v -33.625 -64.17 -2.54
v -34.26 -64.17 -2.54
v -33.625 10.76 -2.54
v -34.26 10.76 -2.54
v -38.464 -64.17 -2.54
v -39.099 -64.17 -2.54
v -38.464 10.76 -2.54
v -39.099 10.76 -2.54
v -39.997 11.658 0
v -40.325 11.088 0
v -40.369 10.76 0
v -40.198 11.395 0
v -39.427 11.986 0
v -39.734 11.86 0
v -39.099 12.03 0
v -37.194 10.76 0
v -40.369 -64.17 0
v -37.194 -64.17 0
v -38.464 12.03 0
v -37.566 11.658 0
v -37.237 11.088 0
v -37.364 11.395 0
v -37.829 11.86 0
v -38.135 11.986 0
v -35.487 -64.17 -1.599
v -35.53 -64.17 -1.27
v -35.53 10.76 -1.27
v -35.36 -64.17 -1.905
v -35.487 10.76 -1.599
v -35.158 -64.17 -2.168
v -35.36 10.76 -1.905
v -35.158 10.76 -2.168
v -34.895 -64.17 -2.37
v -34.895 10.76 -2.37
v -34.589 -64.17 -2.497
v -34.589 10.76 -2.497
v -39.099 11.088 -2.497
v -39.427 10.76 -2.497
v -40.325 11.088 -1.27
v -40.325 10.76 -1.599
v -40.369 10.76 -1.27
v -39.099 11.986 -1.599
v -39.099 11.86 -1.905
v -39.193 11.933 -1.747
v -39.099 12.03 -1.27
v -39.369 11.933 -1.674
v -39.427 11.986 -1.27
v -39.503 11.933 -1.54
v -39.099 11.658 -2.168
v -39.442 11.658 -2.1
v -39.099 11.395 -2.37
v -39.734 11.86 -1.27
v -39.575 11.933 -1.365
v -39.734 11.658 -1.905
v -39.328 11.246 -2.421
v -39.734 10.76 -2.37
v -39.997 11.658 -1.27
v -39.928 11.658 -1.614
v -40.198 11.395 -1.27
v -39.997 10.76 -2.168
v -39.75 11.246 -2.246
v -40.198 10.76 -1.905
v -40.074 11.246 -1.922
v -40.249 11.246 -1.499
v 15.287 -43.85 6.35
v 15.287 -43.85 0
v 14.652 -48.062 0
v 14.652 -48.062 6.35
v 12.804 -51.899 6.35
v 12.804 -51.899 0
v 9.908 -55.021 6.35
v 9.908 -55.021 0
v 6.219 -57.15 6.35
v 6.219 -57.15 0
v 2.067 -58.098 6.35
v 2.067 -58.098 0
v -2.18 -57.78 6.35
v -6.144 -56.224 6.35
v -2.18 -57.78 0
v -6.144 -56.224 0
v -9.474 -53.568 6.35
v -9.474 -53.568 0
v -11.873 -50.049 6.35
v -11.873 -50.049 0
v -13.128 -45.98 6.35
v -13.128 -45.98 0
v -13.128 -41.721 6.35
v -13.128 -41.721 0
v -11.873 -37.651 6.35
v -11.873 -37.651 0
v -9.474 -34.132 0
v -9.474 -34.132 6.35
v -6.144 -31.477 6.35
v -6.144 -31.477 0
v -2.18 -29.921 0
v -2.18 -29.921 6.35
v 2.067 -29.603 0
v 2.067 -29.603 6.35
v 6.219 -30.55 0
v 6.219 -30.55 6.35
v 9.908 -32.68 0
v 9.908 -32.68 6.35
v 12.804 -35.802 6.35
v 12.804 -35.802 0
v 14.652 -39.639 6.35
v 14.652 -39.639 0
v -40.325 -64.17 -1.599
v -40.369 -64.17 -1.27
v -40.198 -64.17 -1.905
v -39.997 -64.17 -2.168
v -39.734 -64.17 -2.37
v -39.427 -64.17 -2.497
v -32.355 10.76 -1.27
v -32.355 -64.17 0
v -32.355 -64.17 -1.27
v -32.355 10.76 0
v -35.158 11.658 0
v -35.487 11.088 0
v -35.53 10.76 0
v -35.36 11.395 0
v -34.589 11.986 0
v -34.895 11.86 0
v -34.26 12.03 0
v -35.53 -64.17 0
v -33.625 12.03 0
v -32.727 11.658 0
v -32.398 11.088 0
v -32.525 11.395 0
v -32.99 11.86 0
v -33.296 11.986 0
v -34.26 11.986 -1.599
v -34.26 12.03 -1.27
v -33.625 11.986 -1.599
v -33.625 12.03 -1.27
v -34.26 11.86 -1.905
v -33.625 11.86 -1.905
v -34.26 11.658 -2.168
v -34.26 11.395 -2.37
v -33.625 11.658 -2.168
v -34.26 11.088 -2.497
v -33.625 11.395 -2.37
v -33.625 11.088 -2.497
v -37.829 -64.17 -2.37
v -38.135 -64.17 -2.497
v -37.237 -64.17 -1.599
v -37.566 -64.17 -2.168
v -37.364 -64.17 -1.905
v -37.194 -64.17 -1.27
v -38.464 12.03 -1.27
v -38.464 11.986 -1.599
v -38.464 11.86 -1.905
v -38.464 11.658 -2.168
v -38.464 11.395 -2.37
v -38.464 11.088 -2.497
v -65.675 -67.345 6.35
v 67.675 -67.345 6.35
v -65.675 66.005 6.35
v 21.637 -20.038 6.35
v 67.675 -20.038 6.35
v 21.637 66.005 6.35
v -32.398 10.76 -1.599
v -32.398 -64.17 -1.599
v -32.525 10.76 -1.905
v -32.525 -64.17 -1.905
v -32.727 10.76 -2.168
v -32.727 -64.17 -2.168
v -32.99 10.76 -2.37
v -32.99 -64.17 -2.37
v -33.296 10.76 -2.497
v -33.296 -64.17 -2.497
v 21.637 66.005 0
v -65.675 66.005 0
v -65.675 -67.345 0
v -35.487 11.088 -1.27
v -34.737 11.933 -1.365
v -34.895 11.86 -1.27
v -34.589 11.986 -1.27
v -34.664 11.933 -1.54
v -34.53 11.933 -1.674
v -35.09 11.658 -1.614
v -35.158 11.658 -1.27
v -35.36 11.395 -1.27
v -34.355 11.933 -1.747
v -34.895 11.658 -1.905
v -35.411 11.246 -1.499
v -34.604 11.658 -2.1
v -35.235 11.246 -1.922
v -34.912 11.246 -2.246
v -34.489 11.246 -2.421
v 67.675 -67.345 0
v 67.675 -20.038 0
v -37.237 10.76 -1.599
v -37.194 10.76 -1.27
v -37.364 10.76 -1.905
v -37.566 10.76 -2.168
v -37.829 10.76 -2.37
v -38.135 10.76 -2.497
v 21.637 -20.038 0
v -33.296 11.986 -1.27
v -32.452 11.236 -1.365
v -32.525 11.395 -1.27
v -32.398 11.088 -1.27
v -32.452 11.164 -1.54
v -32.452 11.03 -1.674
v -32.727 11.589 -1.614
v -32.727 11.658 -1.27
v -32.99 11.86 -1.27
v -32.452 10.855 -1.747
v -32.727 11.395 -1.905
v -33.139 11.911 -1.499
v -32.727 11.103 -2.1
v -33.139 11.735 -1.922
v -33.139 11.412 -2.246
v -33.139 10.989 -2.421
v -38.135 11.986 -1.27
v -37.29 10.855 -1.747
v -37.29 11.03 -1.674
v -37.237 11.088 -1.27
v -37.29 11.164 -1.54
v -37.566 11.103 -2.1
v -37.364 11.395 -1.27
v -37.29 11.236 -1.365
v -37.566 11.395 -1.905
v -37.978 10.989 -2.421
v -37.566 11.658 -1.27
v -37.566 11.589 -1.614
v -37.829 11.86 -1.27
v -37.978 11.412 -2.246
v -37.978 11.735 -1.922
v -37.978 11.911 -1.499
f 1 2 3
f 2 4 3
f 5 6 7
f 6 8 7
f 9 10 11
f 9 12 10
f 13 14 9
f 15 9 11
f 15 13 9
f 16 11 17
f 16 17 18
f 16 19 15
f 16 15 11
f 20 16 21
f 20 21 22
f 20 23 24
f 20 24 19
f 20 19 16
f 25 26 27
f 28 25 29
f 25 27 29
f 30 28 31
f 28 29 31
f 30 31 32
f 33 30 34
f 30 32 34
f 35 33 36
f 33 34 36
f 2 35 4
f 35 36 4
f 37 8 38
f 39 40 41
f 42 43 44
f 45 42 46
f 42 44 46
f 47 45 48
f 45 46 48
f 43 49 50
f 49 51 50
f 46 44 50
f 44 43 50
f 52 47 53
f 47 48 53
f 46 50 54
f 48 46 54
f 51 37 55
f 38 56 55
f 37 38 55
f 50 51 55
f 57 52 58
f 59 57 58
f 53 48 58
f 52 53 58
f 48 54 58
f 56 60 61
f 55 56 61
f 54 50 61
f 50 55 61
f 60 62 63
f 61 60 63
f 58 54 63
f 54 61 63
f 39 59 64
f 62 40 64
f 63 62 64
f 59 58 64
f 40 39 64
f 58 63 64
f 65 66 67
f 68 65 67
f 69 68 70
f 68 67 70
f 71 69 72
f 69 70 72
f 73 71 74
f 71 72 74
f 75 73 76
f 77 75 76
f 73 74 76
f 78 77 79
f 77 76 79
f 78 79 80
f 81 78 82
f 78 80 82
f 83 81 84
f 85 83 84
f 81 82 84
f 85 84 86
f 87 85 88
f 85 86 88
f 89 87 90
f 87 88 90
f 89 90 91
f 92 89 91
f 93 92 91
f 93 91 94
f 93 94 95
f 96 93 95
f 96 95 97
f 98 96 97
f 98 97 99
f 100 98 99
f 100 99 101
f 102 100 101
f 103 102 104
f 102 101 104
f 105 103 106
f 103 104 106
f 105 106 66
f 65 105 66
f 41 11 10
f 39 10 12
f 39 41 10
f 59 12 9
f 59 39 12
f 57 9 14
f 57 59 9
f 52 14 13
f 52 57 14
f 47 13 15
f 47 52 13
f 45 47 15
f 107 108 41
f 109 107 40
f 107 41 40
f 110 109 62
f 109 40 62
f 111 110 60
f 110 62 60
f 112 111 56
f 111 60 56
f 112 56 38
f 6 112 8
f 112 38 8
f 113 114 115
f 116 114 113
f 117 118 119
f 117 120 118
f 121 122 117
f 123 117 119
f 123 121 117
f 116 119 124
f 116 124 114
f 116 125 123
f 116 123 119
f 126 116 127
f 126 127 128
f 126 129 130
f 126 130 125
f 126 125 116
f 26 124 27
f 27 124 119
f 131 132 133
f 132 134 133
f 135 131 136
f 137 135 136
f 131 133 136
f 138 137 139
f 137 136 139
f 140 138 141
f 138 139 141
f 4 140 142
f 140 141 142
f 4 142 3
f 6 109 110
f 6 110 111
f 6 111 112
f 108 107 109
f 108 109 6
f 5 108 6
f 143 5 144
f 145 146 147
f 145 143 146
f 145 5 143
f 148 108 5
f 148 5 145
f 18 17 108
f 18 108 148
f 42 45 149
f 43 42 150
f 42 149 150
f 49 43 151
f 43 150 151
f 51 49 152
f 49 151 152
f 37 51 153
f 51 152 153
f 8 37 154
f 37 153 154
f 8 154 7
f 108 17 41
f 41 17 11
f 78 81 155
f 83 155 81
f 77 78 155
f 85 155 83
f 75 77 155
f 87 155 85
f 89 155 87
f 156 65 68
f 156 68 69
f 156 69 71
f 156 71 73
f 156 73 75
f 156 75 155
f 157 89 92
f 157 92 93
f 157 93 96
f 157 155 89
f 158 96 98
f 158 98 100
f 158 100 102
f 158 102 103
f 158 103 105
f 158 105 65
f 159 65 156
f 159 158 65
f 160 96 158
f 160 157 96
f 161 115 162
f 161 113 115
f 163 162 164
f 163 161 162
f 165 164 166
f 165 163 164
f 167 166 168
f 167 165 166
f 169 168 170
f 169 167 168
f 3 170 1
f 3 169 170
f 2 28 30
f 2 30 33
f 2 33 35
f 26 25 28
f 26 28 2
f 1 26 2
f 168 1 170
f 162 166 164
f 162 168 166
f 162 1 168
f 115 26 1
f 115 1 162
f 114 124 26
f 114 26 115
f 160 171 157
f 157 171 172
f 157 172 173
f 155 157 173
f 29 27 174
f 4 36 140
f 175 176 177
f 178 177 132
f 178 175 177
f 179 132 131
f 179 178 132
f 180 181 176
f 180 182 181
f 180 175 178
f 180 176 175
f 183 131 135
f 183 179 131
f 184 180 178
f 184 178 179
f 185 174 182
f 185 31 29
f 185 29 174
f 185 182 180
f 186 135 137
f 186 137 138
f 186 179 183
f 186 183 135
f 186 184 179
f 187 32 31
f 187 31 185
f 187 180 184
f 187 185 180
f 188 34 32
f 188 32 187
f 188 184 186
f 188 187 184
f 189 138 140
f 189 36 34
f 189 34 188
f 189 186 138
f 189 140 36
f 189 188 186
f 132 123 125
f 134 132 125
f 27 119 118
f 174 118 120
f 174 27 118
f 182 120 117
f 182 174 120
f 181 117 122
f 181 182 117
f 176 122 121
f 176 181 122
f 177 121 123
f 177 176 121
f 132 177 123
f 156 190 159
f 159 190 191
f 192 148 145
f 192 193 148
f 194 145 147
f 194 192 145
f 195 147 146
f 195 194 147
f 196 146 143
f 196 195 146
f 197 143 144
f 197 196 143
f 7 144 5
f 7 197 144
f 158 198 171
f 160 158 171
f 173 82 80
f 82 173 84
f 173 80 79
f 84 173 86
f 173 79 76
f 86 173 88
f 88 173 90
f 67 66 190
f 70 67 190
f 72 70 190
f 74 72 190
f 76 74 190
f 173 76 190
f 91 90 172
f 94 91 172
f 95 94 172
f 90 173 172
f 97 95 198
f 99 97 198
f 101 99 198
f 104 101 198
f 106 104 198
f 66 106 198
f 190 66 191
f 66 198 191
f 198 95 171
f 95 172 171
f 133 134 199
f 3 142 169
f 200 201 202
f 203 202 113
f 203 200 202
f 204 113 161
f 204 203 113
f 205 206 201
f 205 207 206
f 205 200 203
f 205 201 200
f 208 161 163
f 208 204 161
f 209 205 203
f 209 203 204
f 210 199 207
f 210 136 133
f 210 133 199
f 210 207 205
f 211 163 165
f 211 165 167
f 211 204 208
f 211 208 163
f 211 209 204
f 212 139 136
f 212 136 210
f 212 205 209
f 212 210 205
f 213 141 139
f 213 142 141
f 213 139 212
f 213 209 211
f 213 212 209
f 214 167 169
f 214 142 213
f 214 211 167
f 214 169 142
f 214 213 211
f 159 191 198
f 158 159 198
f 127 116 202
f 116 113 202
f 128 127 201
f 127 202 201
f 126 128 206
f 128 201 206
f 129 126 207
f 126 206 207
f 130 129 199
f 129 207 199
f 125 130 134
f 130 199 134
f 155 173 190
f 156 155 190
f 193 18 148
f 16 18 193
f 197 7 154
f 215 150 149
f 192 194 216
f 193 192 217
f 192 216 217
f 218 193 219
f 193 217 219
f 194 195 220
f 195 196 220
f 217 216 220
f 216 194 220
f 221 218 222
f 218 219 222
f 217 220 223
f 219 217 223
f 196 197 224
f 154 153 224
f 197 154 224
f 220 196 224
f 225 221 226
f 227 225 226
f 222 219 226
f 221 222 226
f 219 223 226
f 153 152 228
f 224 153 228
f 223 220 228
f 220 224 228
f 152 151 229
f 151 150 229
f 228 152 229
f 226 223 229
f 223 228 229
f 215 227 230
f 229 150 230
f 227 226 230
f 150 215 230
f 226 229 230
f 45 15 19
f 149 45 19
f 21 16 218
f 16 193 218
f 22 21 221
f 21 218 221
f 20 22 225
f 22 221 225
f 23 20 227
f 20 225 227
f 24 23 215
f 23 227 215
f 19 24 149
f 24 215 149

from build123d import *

# Parameters (mm, degrees)
F0_W     = 3.175
F0_H     = 76.2
F1_DEPTH = 2.54
F0_W_2   = 6.35
F0_H_2   = 40.9575
F0_W_3   = 31.749999404
F0_H_3   = 37.7825
F0_H_4   = 3.175
F0_H_5   = 6.35
F0_W_4   = 14.3044306234
F0_H_6   = 86.0425
F0_W_5   = 6.350000596
F2_DEPTH = 6.35
F3_R     = 1.27
F3_2_R   = 1.27


with BuildPart() as f1:
    # F0 (on Top) → F1 (new body)
    with BuildSketch(Plane.XY):
        with Locations((-33.9424085811, -26.0702777778)):
            Rectangle(F0_W, F0_H)
    extrude(amount=-F1_DEPTH)

    # F3#2
    f3_2_edges = [f1.edges().sort_by_distance(p)[0] for p in [
        (-35.529909, -26.070278, -2.54),
        (-35.529909, 12.029722, -1.27),
        (-33.942409, 12.029722, -2.54),
        (-32.354909, 12.029722, -1.27),
        (-32.354909, -26.070278, -2.54),
    ]]
    fillet(f3_2_edges, radius=F3_2_R)


with BuildPart() as f1b:
    # F0 (on Top) → F1, piece 2 (new body)
    with BuildSketch(Plane.XY):
        with Locations((-38.7811085811, -26.0702777778)):
            Rectangle(F0_W, F0_H)
    extrude(amount=-F1_DEPTH)

    # F3
    f3_edges = [f1b.edges().sort_by_distance(p)[0] for p in [
        (-40.368609, -26.070278, -2.54),
        (-38.781109, 12.029722, -2.54),
        (-40.368609, 12.029722, -1.27),
        (-37.193609, -26.070278, -2.54),
        (-37.193609, 12.029722, -1.27),
    ]]
    fillet(f3_edges, radius=F3_R)


with BuildPart() as f2:
    # F0 (on Top) → F2 (new body)
    with BuildSketch(Plane.XY):
        Polygon((-19.6549085811, 62.8297222222), (-56.1504779578, 62.8297222222), (-56.1504779578, 56.4797222222), (-62.5004779578, 56.4797222222), (-62.5004779578, -64.1702777778), (-40.8539100051, -64.1702777778), (-40.3686085811, -64.1702777778), (-40.3686085811, 12.0297222222), (-37.1936085811, 12.0297222222), (-37.1936085811, -64.1702777778), (-35.5299085811, -64.1702777778), (-35.5299085811, 12.0297222222), (-32.3549085811, 12.0297222222), (-32.3549085811, -64.1702777778), (-19.6549085811, -64.1702777778), (-19.6549085811, -23.2127777778), (-19.6549085811, 27.9047222222), align=None)
        Polygon((-62.5004779578, 56.4797222222), (-62.5004779578, 62.8297222222), (-65.6754779578, 62.8297222222), (-65.6754779578, -67.3452777778), (64.4995220422, -67.3452777778), (64.4995220422, -64.1702777778), (32.7495226383, -64.1702777778), (21.6370226383, -64.1702777778), (15.2870220422, -64.1702777778), (0.9995220422, -64.1702777778), (-13.3049085811, -64.1702777778), (-19.6549085811, -64.1702777778), (-32.3549085811, -64.1702777778), (-35.5299085811, -64.1702777778), (-37.1936085811, -64.1702777778), (-40.3686085811, -64.1702777778), (-40.8539100051, -64.1702777778), (-62.5004779578, -64.1702777778), align=None)
        with Locations((-16.4799085811, -43.6915277778)):
            Rectangle(F0_W_2, F0_H_2)
        with BuildLine():
            Line((0.9995220422, -23.2127777778), (-13.3049085811, -23.2127777778))
            Line((-13.3049085811, -23.2127777778), (-13.3049085811, -64.1702777778))
            Line((-13.3049085811, -64.1702777778), (0.9995220422, -64.1702777778))
            Line((0.9995220422, -64.1702777778), (0.9995220422, -58.1377777778))
            ThreePointArc((0.9995220422, -58.1377777778), (-13.2879779578, -43.8502777778), (0.9995220422, -29.5627777778))
            Line((0.9995220422, -29.5627777778), (0.9995220422, -23.2127777778))
        make_face()
        with BuildLine():
            Line((15.2870220422, -23.2127777778), (0.9995220422, -23.2127777778))
            Line((0.9995220422, -23.2127777778), (0.9995220422, -29.5627777778))
            ThreePointArc((0.9995220422, -29.5627777778), (11.1023101784, -33.7474896416), (15.2870220422, -43.8502777778))
            Line((15.2870220422, -43.8502777778), (15.2870220422, -23.2127777778))
        make_face()
        with BuildLine():
            Line((0.9995220422, -58.1377777778), (0.9995220422, -64.1702777778))
            Line((0.9995220422, -64.1702777778), (15.2870220422, -64.1702777778))
            Line((15.2870220422, -64.1702777778), (15.2870220422, -43.8502777778))
            ThreePointArc((15.2870220422, -43.8502777778), (11.1023101784, -53.953065914), (0.9995220422, -58.1377777778))
        make_face()
        Polygon((21.6370226383, -23.2127777778), (15.2870220422, -23.2127777778), (15.2870220422, -43.8502777778), (15.2870220422, -64.1702777778), (21.6370226383, -64.1702777778), align=None)
        Polygon((21.6370226383, -64.1702777778), (32.7495226383, -64.1702777778), (32.7495226383, -26.3877777778), (32.7495226383, -23.2127777778), (21.6370226383, -23.2127777778), align=None)
        with Locations((48.6245223403, -45.2790277778)):
            Rectangle(F0_W_3, F0_H_3)
        with Locations((48.6245223403, -24.8002777778)):
            Rectangle(F0_W_3, F0_H_4)
        Polygon((32.7495226383, -23.2127777778), (64.4995220422, -23.2127777778), (64.4995220422, -20.0377777778), (21.6370226383, -20.0377777778), (21.6370226383, -23.2127777778), align=None)
        Polygon((64.4995220422, -64.1702777778), (64.4995220422, -67.3452777778), (67.6745220422, -67.3452777778), (67.6745220422, -23.2127777778), (64.4995220422, -23.2127777778), (64.4995220422, -26.3877777778), align=None)
        Polygon((8.9370220422, 62.8297222222), (0.9995220422, 62.8297222222), (0.9995220422, -23.2127777778), (15.2870220422, -23.2127777778), (15.2870220422, 56.4797222222), (8.9370220422, 56.4797222222), align=None)
        with Locations((12.1120220422, 59.6547222222)):
            Rectangle(F0_W_2, F0_H_5)
        Polygon((-13.3049085811, 62.8297222222), (-19.6549085811, 62.8297222222), (-19.6549085811, 27.9047222222), (-19.6549085811, -23.2127777778), (-13.3049085811, -23.2127777778), align=None)
        with Locations((-6.1526932694, 19.8084722222)):
            Rectangle(F0_W_4, F0_H_6)
        Polygon((-62.5004779578, 66.0047222222), (-62.5004779578, 62.8297222222), (-56.1504779578, 62.8297222222), (-19.6549085811, 62.8297222222), (-13.3049085811, 62.8297222222), (0.9995220422, 62.8297222222), (8.9370220422, 62.8297222222), (15.2870220422, 62.8297222222), (15.2870220422, 66.0047222222), align=None)
        with Locations((-59.3254779578, 59.6547222222)):
            Rectangle(F0_W_2, F0_H_5)
        with Locations((-64.0879779578, 64.4172222222)):
            Rectangle(F0_W, F0_H_4)
        Polygon((21.6370226383, 62.8297222222), (15.2870220422, 62.8297222222), (15.2870220422, 56.4797222222), (15.2870220422, -23.2127777778), (21.6370226383, -23.2127777778), (21.6370226383, -20.0377777778), (21.6370226383, 27.9047222222), align=None)
        with Locations((18.4620223403, 64.4172222222)):
            Rectangle(F0_W_5, F0_H_4)
        with Locations((66.0870220422, -21.6252777778)):
            Rectangle(F0_W, F0_H_4)
        with Locations((-33.9424085811, -26.0702777778)):
            Rectangle(F0_W, F0_H)
        with Locations((-38.7811085811, -26.0702777778)):
            Rectangle(F0_W, F0_H)
    extrude(amount=F2_DEPTH)


solid = Compound([f1.part, f1b.part, f2.part])
